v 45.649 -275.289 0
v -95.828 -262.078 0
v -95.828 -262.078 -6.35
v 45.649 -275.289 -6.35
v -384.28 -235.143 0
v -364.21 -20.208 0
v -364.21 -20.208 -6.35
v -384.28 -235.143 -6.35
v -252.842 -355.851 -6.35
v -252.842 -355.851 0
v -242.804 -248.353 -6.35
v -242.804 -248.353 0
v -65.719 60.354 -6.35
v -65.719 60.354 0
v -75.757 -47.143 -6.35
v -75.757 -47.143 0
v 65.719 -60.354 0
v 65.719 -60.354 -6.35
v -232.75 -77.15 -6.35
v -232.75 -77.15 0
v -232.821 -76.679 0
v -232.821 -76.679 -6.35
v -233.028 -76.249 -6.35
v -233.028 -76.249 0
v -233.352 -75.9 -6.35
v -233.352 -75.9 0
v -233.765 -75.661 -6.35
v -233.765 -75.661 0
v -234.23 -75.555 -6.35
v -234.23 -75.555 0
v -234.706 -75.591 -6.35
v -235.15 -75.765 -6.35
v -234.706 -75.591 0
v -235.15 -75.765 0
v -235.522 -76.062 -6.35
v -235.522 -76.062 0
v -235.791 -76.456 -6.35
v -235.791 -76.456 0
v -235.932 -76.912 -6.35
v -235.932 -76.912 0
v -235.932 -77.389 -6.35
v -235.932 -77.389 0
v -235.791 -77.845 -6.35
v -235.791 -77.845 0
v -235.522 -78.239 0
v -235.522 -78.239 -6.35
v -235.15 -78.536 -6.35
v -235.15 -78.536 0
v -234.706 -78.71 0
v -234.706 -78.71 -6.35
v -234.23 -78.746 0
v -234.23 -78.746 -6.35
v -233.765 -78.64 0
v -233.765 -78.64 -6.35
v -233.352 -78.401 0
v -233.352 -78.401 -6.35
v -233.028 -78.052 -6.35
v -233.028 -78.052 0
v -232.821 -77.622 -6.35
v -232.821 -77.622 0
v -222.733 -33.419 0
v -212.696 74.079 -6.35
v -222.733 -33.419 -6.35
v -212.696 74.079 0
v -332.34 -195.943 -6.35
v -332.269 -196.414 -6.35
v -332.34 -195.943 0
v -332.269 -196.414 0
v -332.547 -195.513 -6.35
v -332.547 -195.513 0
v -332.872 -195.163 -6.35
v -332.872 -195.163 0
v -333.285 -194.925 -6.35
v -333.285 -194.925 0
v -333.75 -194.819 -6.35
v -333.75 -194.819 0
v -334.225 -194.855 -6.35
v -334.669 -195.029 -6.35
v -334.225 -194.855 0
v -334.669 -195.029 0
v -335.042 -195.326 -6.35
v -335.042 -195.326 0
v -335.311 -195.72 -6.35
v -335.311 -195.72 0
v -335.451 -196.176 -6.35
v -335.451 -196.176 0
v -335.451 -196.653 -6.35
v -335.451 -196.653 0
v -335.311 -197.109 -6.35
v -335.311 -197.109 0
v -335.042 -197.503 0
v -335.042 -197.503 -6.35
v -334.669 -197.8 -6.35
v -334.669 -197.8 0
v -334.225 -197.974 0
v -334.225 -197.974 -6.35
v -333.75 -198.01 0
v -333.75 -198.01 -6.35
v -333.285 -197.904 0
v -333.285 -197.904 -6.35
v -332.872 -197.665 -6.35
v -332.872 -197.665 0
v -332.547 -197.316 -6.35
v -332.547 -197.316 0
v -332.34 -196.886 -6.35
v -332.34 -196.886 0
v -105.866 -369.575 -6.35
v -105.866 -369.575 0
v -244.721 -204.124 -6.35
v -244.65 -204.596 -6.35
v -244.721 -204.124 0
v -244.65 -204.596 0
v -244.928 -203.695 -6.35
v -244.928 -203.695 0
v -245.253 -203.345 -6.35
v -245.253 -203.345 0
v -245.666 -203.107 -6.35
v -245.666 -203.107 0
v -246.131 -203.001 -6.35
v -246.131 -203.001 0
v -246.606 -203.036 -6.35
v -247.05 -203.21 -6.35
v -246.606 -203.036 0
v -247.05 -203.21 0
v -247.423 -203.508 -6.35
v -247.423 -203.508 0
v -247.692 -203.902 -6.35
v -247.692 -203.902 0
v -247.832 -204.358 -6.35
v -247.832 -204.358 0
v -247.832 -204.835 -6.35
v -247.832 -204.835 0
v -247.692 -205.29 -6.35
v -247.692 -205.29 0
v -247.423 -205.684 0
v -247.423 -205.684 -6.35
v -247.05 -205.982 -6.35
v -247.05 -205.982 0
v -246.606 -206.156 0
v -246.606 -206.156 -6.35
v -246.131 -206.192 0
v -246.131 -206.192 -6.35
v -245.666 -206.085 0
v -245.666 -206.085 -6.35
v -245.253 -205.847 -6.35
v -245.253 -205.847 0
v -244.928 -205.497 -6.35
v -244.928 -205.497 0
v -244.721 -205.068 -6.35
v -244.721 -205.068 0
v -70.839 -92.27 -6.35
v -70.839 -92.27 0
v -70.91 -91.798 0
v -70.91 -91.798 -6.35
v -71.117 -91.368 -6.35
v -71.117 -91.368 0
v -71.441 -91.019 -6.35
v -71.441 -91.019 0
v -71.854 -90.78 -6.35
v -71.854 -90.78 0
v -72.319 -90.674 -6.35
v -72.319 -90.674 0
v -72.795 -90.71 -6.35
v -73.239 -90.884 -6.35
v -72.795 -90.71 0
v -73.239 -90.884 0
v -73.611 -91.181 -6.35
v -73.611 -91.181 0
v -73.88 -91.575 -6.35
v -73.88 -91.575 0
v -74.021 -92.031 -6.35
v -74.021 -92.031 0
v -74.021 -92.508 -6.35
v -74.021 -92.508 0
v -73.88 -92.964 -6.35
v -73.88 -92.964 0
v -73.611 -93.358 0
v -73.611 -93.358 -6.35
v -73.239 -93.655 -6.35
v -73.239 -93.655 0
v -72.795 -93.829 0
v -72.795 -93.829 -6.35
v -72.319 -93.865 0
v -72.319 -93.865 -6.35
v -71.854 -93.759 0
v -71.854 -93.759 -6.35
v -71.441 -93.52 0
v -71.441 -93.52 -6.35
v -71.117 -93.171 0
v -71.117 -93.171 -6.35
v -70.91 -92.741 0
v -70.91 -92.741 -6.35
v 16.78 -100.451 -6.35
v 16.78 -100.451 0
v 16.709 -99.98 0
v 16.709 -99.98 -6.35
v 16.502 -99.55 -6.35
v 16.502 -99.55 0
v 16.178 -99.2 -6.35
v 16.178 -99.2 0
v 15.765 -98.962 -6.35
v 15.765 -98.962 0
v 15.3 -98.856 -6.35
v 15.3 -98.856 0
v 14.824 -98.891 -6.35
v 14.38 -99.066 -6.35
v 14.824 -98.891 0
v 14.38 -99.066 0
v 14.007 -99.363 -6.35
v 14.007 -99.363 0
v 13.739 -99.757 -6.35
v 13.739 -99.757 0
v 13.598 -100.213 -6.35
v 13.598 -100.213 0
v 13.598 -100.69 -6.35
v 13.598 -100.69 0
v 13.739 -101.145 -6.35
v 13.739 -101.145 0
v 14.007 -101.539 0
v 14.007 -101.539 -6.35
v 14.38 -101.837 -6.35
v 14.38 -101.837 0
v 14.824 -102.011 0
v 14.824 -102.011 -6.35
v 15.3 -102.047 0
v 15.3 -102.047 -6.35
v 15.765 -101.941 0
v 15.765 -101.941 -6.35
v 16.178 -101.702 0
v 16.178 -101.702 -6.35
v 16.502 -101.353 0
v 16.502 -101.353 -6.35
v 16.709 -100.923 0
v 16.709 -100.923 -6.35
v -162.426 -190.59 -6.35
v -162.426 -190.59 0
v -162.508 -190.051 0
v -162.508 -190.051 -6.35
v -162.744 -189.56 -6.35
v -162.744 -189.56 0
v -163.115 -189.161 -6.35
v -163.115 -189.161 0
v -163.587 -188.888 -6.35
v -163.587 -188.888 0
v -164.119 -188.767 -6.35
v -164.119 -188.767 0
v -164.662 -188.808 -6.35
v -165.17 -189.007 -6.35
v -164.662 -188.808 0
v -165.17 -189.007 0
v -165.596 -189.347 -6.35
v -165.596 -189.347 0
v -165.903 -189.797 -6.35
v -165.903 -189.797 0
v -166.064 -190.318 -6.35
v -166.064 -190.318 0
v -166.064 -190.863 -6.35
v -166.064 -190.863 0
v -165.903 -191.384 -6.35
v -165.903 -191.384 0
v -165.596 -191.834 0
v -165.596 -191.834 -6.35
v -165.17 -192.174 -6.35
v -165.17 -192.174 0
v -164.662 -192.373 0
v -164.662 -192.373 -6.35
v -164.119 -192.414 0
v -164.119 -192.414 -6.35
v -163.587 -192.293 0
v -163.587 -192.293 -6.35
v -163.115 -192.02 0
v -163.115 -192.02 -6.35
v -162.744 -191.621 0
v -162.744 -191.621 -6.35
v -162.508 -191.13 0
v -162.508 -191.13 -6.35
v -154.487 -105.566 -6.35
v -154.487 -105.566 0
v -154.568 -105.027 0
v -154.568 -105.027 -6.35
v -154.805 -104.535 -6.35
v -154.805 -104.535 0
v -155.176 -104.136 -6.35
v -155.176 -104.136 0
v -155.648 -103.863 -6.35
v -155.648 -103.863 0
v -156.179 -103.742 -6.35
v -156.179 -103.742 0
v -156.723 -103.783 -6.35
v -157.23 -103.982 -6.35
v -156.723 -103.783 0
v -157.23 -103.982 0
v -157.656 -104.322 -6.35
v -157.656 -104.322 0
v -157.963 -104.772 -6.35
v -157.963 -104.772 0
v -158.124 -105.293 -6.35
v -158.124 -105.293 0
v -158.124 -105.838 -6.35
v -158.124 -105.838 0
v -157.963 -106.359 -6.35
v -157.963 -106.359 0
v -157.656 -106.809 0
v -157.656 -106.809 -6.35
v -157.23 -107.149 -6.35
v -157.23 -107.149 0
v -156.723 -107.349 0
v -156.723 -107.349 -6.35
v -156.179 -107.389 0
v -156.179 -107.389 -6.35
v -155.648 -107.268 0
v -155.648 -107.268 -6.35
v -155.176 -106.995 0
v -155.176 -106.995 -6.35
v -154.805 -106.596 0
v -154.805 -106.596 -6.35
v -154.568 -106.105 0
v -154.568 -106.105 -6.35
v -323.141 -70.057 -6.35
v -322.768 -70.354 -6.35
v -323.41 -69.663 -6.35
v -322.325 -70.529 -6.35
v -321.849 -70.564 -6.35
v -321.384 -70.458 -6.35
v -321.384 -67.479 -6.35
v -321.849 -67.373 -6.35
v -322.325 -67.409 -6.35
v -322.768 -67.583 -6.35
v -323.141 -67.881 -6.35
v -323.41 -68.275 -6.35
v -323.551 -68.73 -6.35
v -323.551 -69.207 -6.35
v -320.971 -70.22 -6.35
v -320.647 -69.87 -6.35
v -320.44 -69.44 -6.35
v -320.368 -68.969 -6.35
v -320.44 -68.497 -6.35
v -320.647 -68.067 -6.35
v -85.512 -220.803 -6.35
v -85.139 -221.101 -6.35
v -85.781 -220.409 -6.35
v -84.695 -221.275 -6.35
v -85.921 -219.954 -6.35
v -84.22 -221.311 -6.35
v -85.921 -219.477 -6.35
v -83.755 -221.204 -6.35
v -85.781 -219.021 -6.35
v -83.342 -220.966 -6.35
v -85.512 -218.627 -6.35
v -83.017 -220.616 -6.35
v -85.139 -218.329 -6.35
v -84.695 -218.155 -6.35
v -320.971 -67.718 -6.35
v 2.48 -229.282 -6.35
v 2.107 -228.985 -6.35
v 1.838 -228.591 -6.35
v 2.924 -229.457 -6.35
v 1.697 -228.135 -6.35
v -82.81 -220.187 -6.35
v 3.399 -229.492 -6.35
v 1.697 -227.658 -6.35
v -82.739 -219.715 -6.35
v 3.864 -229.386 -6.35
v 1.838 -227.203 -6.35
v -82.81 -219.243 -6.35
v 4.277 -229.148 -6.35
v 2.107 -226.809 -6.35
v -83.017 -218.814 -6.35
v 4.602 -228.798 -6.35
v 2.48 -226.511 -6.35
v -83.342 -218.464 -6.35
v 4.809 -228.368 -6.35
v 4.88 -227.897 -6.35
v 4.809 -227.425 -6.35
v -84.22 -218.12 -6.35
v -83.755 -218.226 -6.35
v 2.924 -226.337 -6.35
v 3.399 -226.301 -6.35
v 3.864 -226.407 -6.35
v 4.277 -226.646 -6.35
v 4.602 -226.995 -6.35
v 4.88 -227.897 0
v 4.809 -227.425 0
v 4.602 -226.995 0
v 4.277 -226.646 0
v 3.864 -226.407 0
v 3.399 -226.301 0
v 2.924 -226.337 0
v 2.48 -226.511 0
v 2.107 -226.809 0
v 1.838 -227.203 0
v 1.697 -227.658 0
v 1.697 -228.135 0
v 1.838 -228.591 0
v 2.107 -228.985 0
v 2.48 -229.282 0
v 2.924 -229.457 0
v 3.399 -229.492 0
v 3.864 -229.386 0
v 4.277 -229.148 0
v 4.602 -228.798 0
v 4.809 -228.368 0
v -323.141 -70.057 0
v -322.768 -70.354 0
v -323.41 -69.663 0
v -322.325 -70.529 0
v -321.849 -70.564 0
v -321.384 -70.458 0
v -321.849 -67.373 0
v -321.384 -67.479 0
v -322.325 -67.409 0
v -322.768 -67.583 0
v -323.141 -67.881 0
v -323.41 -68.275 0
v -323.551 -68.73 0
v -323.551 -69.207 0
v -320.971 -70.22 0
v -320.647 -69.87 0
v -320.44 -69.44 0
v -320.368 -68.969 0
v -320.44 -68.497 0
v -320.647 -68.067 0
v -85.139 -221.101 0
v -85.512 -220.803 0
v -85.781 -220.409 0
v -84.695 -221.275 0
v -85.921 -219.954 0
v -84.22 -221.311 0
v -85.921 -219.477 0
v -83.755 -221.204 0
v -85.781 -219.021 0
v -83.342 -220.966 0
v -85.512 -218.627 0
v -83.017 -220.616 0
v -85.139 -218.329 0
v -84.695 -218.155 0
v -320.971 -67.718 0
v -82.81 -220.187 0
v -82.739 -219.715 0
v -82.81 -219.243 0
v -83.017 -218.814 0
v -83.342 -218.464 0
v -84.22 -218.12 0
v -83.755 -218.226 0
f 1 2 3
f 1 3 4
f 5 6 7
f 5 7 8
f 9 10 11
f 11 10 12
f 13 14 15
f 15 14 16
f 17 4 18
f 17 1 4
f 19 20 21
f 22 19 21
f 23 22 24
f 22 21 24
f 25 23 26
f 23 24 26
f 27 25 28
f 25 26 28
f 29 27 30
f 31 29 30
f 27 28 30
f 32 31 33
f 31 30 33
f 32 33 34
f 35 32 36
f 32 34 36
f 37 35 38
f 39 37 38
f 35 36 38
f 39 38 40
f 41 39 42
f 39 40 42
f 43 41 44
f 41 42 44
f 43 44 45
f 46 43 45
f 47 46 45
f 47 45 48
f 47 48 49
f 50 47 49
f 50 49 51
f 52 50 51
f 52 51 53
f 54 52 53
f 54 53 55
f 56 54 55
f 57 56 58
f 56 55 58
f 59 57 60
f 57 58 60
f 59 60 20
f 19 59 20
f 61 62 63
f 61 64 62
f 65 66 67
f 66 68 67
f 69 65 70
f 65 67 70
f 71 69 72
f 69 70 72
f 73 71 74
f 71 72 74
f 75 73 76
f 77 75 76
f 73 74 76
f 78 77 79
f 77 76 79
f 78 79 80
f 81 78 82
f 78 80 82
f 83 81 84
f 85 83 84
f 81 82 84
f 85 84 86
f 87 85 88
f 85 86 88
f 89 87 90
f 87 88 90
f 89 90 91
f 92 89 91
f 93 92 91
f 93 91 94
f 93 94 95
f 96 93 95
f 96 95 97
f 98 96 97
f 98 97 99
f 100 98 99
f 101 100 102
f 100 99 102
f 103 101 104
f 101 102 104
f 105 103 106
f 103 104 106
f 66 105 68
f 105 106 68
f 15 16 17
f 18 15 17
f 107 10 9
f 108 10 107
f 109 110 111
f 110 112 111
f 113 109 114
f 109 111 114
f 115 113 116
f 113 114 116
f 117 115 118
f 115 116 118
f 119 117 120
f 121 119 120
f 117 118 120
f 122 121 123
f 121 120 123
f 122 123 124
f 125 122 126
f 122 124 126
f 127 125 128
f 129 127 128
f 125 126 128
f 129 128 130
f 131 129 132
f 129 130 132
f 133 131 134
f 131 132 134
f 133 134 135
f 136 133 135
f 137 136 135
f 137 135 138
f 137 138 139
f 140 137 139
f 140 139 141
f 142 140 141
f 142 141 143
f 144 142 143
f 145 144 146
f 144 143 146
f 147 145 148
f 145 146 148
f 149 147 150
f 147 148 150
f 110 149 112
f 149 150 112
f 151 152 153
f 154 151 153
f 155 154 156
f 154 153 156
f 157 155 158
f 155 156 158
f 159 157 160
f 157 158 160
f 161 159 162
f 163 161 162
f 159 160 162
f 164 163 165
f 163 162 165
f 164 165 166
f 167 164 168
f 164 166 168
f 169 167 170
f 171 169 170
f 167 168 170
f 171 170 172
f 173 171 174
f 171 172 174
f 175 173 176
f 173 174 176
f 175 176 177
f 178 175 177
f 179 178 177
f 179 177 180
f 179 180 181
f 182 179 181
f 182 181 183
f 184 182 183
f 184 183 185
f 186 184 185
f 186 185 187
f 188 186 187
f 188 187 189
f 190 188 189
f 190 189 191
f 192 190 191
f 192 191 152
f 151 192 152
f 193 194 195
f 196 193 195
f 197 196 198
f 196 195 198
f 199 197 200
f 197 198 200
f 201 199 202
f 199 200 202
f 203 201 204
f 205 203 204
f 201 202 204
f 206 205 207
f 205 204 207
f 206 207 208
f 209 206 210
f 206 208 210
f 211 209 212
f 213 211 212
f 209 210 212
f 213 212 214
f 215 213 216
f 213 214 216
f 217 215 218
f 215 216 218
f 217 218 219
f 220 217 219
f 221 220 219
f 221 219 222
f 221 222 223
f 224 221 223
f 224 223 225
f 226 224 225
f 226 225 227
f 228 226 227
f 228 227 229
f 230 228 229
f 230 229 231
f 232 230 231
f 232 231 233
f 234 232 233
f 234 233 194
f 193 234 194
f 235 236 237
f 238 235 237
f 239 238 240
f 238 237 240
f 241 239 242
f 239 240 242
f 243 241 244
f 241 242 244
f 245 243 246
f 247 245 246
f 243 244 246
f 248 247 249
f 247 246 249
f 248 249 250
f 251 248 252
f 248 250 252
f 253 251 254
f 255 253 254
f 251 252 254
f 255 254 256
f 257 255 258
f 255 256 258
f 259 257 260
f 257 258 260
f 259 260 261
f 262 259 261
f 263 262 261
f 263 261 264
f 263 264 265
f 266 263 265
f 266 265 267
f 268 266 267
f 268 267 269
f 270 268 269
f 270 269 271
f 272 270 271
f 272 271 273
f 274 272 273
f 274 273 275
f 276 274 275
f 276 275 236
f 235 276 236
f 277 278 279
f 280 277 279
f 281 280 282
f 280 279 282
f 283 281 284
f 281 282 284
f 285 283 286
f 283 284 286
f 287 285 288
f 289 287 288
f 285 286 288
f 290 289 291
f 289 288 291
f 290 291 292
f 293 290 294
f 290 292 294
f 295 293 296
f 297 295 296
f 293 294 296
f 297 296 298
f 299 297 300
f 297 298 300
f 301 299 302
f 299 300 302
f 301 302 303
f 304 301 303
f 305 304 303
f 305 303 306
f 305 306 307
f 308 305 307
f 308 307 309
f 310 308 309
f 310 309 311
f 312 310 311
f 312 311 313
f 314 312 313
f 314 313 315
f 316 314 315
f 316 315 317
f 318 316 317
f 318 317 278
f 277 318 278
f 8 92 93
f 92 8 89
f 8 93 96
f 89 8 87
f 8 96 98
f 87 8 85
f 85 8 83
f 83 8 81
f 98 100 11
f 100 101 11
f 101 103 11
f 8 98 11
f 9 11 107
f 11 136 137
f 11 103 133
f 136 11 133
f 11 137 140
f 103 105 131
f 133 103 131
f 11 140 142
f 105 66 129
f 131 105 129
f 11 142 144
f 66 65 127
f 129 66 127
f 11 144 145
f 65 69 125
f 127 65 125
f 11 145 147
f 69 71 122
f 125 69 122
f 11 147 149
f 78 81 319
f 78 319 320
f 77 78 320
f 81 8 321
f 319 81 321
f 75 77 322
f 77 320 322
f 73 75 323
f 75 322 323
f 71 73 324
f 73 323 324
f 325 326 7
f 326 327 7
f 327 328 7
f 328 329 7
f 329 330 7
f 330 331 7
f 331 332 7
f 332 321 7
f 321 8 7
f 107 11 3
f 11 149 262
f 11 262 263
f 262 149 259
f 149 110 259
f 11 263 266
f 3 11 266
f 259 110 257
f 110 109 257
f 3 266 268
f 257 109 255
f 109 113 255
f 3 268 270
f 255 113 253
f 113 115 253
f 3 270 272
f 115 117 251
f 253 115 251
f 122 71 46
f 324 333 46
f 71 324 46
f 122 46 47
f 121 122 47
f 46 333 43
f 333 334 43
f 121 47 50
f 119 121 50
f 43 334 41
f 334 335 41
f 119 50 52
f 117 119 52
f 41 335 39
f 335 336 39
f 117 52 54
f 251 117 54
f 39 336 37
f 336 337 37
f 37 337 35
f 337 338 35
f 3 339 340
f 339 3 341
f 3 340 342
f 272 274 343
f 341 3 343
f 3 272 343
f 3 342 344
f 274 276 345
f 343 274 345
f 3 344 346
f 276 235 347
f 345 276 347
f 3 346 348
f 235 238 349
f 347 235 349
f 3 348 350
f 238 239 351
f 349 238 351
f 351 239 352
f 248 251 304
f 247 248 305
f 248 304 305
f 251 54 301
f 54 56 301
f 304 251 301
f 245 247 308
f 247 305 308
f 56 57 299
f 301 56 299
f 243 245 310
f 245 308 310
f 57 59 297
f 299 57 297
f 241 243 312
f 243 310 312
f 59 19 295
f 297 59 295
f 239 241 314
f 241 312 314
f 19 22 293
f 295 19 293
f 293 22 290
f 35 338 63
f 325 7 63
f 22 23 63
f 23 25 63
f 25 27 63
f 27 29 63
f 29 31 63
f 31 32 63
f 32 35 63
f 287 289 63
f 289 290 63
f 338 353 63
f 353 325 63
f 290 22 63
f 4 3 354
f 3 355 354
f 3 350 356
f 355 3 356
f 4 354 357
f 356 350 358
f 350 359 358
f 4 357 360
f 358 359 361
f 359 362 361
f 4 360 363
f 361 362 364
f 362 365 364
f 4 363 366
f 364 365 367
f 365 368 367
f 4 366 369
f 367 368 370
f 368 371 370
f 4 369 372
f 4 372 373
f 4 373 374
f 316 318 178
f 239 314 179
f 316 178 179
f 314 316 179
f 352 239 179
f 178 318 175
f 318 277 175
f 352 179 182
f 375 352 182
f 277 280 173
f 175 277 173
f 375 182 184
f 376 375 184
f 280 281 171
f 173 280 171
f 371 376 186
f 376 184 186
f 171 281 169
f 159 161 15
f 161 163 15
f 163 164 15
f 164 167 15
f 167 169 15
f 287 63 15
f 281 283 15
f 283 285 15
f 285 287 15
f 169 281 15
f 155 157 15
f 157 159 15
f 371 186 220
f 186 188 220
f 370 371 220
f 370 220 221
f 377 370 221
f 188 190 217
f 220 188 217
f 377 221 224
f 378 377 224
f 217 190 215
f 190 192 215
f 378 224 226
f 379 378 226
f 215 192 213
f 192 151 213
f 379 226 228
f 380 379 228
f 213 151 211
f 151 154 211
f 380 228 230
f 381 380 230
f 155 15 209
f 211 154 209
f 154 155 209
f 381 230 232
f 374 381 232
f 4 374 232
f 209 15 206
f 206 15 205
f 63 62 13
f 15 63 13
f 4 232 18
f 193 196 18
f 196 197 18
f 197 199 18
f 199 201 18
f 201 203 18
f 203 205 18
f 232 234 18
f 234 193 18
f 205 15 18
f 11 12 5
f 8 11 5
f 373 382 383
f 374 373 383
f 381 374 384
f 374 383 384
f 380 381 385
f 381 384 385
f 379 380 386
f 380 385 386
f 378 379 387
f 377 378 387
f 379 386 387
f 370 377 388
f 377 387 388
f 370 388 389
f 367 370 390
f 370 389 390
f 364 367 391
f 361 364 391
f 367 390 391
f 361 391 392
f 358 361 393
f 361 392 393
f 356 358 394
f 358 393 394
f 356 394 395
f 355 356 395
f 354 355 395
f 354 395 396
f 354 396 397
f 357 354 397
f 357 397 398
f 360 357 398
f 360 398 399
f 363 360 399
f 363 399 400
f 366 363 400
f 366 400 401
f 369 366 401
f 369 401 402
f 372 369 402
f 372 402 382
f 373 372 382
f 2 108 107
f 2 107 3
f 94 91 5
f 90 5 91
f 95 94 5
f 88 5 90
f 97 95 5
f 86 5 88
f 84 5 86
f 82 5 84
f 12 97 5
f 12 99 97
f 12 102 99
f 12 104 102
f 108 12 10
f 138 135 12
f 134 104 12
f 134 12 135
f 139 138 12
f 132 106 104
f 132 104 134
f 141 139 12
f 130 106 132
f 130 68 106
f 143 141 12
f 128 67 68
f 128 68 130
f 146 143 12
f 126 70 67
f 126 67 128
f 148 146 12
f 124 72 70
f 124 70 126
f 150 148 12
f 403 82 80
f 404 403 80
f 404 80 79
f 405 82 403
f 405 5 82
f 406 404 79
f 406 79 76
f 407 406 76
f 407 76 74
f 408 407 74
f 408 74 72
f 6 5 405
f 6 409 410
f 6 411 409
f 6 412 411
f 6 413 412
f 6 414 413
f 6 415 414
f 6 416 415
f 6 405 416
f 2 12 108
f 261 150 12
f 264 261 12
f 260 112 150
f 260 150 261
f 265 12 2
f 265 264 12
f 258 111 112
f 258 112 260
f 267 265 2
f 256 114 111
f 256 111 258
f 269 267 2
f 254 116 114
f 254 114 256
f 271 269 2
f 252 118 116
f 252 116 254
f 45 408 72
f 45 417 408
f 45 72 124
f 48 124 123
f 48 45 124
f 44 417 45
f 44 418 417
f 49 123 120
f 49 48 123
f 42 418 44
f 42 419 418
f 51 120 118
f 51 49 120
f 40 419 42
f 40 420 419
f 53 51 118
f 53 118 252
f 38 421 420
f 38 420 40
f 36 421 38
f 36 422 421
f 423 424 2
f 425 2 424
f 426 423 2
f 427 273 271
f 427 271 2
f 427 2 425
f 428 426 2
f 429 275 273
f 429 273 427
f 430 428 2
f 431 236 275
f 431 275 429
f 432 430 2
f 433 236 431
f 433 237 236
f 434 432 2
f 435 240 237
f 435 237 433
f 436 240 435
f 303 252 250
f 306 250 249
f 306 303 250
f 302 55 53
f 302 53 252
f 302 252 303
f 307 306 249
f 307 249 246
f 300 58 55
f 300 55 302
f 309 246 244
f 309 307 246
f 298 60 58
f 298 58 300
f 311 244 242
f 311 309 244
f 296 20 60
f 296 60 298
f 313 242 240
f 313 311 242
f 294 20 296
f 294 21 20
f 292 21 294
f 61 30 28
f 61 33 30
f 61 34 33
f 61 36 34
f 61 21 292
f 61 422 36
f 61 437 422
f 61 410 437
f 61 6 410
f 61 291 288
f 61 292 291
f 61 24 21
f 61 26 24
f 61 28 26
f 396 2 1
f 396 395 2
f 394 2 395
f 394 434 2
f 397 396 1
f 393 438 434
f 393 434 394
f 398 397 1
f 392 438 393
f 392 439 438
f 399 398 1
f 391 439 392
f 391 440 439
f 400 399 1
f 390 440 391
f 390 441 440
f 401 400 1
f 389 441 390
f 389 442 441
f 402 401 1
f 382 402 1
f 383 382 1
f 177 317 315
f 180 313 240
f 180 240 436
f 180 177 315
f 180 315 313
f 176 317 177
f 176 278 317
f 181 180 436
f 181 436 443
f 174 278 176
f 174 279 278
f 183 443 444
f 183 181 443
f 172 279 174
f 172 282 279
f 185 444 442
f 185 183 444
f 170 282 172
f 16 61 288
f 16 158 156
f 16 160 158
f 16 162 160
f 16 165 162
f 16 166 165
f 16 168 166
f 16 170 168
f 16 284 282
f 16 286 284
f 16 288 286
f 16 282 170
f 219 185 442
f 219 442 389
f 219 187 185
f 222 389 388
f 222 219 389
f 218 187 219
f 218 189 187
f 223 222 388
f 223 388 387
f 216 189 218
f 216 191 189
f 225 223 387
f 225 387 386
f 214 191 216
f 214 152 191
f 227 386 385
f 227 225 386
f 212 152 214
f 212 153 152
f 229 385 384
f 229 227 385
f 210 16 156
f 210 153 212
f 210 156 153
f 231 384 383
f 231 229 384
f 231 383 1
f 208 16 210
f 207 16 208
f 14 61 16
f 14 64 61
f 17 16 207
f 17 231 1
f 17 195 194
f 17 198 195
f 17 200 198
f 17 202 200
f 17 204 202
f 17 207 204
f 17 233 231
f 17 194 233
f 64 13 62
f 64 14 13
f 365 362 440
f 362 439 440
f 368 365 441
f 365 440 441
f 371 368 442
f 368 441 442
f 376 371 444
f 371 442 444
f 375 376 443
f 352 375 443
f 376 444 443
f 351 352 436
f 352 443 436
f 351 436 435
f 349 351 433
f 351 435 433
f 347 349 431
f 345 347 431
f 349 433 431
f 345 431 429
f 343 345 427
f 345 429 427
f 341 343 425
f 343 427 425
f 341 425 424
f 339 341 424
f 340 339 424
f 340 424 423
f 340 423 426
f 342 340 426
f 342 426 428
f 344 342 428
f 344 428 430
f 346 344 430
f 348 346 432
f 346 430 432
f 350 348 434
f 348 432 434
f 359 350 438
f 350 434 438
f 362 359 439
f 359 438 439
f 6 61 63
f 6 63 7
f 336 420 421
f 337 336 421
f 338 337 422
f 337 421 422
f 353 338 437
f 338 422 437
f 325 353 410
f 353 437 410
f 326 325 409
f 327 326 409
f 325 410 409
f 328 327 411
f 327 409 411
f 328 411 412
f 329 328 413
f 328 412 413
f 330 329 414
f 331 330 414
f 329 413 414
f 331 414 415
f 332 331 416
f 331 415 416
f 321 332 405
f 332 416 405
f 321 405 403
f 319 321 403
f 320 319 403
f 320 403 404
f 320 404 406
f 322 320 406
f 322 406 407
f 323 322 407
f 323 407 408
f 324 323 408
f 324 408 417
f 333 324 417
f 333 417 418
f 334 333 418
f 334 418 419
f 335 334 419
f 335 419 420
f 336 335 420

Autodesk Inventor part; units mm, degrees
ref_plane "YZ Plane" through (0, 0, 0) normal (1, 0, 0) x (0, 1, 0)
ref_plane "XZ Plane" through (0, 0, 0) normal (0, 1, 0) x (-1, 0, 0)
sketch "Sketch1" plane through (0, 0, 0) normal (0, 0, 1) x (1, 0, 0)
  line L0 (-65.7194, 60.3542) -> (-75.7574, -47.1434) projected
  line L1 (-75.7574, -47.1434) -> (65.7194, -60.3542) projected
  line L2 (-95.8276, -262.0778) -> (45.6492, -275.2887) projected
  line L3 (-105.8656, -369.5754) -> (-95.8276, -262.0778) projected
  line L4 (-212.6955, 74.0786) -> (-222.7334, -33.419) projected
  line L5 (-222.7334, -33.419) -> (-364.2102, -20.2081) projected
  line L6 (-242.8036, -248.3534) -> (-384.2805, -235.1426) projected
  line L7 (-252.8416, -355.851) -> (-242.8036, -248.3534) projected
  circle A0 centre (-72.4386, -92.2695) radius 2.6 construction
  circle A1 centre (-84.3392, -219.7151) radius 2.6 construction
  circle A2 centre (3.2796, -227.8968) radius 2.6 construction
  circle A3 centre (15.1803, -100.4512) radius 2.6 construction
  circle A4 centre (-156.3158, -105.5656) radius 1.7526 construction
  circle A5 centre (-164.2553, -190.5905) radius 1.7526 construction
  circle A6 centre (-246.2503, -204.5961) radius 2.6 construction
  circle A7 centre (-333.8691, -196.4144) radius 2.6 construction
  circle A8 centre (-321.9685, -68.9688) radius 2.6 construction
  circle A9 centre (-234.3496, -77.1505) radius 2.6 construction
  circle A10 centre (15.1803, -100.4512) radius 1.6
  circle A11 centre (3.2796, -227.8968) radius 1.6
  circle A12 centre (-84.3392, -219.7151) radius 1.6
  circle A13 centre (-72.4386, -92.2695) radius 1.6
  circle A14 centre (-234.3496, -77.1505) radius 1.6
  circle A15 centre (-321.9685, -68.9688) radius 1.6
  circle A16 centre (-333.8691, -196.4144) radius 1.6
  circle A17 centre (-246.2503, -204.5961) radius 1.6
  line L8 (-65.7194, 60.3542) -> (-212.6955, 74.0786)
  line L9 (-364.2102, -20.2081) -> (-384.2805, -235.1426)
  line L10 (-252.8416, -355.851) -> (-105.8656, -369.5754)
  line L11 (45.6492, -275.2887) -> (65.7194, -60.3542)
  circle A18 centre (-156.3158, -105.5656) radius 1.8288
  circle A19 centre (-164.2553, -190.5905) radius 1.8288
  point P0 (0, 0)
  dimension "d0" = 3.2
  dimension "d1" = 3.2
  dimension "d2" = 3.2
  dimension "d3" = 3.2
  dimension "d4" = 3.2
  dimension "d5" = 3.2
  dimension "d6" = 3.2
  dimension "d7" = 3.2
  dimension "d8" = 3.6576
  dimension "d9" = 3.6576
ref_plane "Work Plane1" through (-97.3094, -87.3563, -6.35) normal (0, 0, -1) x (0, 1, 0)
extrude "Extrusion1" add sketch "Sketch1" against normal up to surface (6.35 mm away)
properties part number "Pod_Holders" material "Aluminum"
